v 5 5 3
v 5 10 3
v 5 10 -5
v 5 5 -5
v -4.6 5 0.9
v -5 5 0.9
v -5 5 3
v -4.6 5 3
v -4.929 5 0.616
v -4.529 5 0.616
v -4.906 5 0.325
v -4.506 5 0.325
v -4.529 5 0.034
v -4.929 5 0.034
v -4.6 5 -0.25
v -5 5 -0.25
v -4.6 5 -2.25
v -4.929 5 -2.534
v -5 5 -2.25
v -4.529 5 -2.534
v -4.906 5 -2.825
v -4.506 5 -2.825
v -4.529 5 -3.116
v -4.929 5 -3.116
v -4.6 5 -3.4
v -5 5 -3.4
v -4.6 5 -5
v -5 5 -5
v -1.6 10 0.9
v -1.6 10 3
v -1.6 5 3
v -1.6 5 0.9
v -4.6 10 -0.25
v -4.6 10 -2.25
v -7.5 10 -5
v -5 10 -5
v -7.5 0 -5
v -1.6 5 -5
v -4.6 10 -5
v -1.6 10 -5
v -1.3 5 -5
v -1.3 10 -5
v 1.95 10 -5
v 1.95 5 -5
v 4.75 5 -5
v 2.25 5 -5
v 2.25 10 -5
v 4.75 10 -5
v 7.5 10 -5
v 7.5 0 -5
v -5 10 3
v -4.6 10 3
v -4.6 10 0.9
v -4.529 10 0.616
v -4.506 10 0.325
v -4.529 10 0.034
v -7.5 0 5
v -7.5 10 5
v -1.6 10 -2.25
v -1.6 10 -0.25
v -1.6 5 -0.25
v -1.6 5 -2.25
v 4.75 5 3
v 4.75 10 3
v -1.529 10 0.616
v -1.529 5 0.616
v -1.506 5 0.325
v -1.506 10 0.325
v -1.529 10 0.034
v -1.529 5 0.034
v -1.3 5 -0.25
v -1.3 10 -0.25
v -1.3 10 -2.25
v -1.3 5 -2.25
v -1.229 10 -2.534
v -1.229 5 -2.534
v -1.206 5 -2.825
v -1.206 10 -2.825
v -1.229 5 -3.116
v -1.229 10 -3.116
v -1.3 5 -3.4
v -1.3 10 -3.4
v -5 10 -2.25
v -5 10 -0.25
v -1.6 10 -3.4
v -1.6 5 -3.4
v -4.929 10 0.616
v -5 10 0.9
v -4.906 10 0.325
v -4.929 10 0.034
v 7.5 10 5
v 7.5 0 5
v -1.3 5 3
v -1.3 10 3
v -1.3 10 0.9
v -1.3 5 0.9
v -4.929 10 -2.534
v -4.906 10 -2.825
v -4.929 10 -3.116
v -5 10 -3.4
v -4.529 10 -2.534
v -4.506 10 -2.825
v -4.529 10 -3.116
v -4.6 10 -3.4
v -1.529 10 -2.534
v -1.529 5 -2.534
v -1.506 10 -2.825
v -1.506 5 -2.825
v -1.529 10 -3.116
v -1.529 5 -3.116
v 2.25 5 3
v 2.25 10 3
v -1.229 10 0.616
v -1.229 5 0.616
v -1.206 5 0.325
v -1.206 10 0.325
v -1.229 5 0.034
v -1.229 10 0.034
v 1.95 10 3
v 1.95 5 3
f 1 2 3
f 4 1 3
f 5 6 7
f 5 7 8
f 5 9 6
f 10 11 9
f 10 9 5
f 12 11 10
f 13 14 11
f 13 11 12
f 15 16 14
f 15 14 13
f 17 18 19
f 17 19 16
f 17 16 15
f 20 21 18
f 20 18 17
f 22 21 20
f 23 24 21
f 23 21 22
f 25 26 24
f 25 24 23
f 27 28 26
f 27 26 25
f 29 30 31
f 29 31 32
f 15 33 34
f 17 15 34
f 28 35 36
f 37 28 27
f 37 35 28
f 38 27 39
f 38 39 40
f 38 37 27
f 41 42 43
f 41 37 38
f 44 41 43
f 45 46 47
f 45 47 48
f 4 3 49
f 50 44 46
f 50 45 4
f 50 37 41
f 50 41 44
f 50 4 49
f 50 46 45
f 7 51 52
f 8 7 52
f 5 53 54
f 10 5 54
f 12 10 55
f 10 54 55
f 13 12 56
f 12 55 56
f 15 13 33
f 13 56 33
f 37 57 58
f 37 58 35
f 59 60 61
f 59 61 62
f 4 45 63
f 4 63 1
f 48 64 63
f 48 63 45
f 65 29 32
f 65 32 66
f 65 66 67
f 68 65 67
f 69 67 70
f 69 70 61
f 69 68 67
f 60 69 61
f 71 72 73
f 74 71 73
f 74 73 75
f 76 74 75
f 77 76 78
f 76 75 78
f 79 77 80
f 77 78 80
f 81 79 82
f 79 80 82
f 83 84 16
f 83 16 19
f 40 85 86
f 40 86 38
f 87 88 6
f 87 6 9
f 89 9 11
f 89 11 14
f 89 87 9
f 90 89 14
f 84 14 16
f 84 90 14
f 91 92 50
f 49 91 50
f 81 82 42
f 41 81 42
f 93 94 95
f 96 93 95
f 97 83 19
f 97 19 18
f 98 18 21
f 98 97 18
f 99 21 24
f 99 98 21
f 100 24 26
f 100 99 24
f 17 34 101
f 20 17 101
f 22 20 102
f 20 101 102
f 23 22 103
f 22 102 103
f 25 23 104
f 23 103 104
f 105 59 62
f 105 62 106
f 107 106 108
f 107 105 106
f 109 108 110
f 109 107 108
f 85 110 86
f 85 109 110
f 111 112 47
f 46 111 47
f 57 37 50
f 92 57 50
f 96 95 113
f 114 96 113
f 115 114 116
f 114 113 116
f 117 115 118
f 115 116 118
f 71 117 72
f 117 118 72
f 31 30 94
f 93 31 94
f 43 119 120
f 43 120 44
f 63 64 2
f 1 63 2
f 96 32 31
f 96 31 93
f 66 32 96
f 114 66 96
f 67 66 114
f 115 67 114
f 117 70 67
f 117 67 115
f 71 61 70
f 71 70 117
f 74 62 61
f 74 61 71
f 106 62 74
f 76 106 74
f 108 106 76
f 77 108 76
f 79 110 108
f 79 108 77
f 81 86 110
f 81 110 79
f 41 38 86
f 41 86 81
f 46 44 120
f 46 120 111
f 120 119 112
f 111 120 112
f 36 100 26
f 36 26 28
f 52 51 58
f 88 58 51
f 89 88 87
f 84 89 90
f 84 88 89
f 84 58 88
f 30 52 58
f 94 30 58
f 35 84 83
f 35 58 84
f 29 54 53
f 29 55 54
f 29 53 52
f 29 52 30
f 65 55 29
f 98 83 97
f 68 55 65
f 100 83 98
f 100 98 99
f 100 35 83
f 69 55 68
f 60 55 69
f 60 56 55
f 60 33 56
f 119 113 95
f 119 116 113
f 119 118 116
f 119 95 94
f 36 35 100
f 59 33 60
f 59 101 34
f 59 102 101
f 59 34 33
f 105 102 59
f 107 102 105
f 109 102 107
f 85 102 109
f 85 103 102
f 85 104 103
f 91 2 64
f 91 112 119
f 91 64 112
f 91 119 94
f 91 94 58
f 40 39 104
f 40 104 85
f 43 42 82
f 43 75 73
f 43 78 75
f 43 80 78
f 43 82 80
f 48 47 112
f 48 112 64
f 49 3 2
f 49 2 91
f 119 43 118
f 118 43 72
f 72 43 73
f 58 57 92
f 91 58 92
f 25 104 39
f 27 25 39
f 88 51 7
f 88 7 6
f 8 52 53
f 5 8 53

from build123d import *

# Parameters (mm, degrees)
SKETCH1_W           = 15
SKETCH1_H           = 10
BOSS_EXTRUDE1_DEPTH = 10
SKETCH2_W           = 0.4
SKETCH2_H           = 8
SKETCH2_W_2         = 0.3
SKETCH2_W_3         = 0.25
CUT_EXTRUDE1_DEPTH  = 5
BOSS_EXTRUDE2_DEPTH = 5
CUT_EXTRUDE2_DEPTH  = 5


with BuildPart() as part:
    # Sketch1 → Boss-Extrude1 (new body)
    with BuildSketch(Plane(origin=(0, 0, 0), x_dir=(1, 0, 0), z_dir=(0, 1, 0))):
        Rectangle(SKETCH1_W, SKETCH1_H)
    extrude(amount=BOSS_EXTRUDE1_DEPTH)

    # Sketch2 → Cut-Extrude1 (cut)
    with BuildSketch(Plane(origin=(0, 10, 0), x_dir=(1, 0, 0), z_dir=(0, 1, 0))):
        with Locations((-4.8, 1)):
            Rectangle(SKETCH2_W, SKETCH2_H)
        with Locations((-1.45, 1)):
            Rectangle(SKETCH2_W_2, SKETCH2_H)
        with Locations((2.1, 1)):
            Rectangle(SKETCH2_W_2, SKETCH2_H)
        with Locations((4.875, 1)):
            Rectangle(SKETCH2_W_3, SKETCH2_H)
    extrude(amount=-CUT_EXTRUDE1_DEPTH, mode=Mode.SUBTRACT)

    # Sketch3 → Boss-Extrude2 (add)
    with BuildSketch(Plane(origin=(0, 10, 0), x_dir=(1, 0, 0), z_dir=(0, 1, 0))):
        with BuildLine():
            Line((-5, 3.4), (-5, 2.25))
            ThreePointArc((-5, 2.25), (-4.90568901, 2.825), (-5, 3.4))
        make_face()
        with BuildLine():
            Line((-5, 0.25), (-5, -0.9))
            ThreePointArc((-5, -0.9), (-4.90568901, -0.325), (-5, 0.25))
        make_face()
        with BuildLine():
            Line((-1.6, 3.4), (-1.6, 2.25))
            ThreePointArc((-1.6, 2.25), (-1.50568901, 2.825), (-1.6, 3.4))
        make_face()
        with BuildLine():
            Line((-1.6, 0.25), (-1.6, -0.9))
            ThreePointArc((-1.6, -0.9), (-1.50568901, -0.325), (-1.6, 0.25))
        make_face()
    extrude(amount=-BOSS_EXTRUDE2_DEPTH)

    # Sketch4 → Cut-Extrude2 (cut)
    with BuildSketch(Plane(origin=(0, 10, 0), x_dir=(1, 0, 0), z_dir=(0, 1, 0))):
        with BuildLine():
            Line((-4.6, 3.4), (-4.6, 2.25))
            ThreePointArc((-4.6, 2.25), (-4.50568901, 2.825), (-4.6, 3.4))
        make_face()
        with BuildLine():
            Line((-4.6, 0.25), (-4.6, -0.9))
            ThreePointArc((-4.6, -0.9), (-4.50568901, -0.325), (-4.6, 0.25))
        make_face()
        with BuildLine():
            Line((-1.3, 3.4), (-1.3, 2.25))
            ThreePointArc((-1.3, 2.25), (-1.20568901, 2.825), (-1.3, 3.4))
        make_face()
        with BuildLine():
            Line((-1.3, 0.25), (-1.3, -0.9))
            ThreePointArc((-1.3, -0.9), (-1.20568901, -0.325), (-1.3, 0.25))
        make_face()
    extrude(amount=-CUT_EXTRUDE2_DEPTH, mode=Mode.SUBTRACT)


solid = part.part
